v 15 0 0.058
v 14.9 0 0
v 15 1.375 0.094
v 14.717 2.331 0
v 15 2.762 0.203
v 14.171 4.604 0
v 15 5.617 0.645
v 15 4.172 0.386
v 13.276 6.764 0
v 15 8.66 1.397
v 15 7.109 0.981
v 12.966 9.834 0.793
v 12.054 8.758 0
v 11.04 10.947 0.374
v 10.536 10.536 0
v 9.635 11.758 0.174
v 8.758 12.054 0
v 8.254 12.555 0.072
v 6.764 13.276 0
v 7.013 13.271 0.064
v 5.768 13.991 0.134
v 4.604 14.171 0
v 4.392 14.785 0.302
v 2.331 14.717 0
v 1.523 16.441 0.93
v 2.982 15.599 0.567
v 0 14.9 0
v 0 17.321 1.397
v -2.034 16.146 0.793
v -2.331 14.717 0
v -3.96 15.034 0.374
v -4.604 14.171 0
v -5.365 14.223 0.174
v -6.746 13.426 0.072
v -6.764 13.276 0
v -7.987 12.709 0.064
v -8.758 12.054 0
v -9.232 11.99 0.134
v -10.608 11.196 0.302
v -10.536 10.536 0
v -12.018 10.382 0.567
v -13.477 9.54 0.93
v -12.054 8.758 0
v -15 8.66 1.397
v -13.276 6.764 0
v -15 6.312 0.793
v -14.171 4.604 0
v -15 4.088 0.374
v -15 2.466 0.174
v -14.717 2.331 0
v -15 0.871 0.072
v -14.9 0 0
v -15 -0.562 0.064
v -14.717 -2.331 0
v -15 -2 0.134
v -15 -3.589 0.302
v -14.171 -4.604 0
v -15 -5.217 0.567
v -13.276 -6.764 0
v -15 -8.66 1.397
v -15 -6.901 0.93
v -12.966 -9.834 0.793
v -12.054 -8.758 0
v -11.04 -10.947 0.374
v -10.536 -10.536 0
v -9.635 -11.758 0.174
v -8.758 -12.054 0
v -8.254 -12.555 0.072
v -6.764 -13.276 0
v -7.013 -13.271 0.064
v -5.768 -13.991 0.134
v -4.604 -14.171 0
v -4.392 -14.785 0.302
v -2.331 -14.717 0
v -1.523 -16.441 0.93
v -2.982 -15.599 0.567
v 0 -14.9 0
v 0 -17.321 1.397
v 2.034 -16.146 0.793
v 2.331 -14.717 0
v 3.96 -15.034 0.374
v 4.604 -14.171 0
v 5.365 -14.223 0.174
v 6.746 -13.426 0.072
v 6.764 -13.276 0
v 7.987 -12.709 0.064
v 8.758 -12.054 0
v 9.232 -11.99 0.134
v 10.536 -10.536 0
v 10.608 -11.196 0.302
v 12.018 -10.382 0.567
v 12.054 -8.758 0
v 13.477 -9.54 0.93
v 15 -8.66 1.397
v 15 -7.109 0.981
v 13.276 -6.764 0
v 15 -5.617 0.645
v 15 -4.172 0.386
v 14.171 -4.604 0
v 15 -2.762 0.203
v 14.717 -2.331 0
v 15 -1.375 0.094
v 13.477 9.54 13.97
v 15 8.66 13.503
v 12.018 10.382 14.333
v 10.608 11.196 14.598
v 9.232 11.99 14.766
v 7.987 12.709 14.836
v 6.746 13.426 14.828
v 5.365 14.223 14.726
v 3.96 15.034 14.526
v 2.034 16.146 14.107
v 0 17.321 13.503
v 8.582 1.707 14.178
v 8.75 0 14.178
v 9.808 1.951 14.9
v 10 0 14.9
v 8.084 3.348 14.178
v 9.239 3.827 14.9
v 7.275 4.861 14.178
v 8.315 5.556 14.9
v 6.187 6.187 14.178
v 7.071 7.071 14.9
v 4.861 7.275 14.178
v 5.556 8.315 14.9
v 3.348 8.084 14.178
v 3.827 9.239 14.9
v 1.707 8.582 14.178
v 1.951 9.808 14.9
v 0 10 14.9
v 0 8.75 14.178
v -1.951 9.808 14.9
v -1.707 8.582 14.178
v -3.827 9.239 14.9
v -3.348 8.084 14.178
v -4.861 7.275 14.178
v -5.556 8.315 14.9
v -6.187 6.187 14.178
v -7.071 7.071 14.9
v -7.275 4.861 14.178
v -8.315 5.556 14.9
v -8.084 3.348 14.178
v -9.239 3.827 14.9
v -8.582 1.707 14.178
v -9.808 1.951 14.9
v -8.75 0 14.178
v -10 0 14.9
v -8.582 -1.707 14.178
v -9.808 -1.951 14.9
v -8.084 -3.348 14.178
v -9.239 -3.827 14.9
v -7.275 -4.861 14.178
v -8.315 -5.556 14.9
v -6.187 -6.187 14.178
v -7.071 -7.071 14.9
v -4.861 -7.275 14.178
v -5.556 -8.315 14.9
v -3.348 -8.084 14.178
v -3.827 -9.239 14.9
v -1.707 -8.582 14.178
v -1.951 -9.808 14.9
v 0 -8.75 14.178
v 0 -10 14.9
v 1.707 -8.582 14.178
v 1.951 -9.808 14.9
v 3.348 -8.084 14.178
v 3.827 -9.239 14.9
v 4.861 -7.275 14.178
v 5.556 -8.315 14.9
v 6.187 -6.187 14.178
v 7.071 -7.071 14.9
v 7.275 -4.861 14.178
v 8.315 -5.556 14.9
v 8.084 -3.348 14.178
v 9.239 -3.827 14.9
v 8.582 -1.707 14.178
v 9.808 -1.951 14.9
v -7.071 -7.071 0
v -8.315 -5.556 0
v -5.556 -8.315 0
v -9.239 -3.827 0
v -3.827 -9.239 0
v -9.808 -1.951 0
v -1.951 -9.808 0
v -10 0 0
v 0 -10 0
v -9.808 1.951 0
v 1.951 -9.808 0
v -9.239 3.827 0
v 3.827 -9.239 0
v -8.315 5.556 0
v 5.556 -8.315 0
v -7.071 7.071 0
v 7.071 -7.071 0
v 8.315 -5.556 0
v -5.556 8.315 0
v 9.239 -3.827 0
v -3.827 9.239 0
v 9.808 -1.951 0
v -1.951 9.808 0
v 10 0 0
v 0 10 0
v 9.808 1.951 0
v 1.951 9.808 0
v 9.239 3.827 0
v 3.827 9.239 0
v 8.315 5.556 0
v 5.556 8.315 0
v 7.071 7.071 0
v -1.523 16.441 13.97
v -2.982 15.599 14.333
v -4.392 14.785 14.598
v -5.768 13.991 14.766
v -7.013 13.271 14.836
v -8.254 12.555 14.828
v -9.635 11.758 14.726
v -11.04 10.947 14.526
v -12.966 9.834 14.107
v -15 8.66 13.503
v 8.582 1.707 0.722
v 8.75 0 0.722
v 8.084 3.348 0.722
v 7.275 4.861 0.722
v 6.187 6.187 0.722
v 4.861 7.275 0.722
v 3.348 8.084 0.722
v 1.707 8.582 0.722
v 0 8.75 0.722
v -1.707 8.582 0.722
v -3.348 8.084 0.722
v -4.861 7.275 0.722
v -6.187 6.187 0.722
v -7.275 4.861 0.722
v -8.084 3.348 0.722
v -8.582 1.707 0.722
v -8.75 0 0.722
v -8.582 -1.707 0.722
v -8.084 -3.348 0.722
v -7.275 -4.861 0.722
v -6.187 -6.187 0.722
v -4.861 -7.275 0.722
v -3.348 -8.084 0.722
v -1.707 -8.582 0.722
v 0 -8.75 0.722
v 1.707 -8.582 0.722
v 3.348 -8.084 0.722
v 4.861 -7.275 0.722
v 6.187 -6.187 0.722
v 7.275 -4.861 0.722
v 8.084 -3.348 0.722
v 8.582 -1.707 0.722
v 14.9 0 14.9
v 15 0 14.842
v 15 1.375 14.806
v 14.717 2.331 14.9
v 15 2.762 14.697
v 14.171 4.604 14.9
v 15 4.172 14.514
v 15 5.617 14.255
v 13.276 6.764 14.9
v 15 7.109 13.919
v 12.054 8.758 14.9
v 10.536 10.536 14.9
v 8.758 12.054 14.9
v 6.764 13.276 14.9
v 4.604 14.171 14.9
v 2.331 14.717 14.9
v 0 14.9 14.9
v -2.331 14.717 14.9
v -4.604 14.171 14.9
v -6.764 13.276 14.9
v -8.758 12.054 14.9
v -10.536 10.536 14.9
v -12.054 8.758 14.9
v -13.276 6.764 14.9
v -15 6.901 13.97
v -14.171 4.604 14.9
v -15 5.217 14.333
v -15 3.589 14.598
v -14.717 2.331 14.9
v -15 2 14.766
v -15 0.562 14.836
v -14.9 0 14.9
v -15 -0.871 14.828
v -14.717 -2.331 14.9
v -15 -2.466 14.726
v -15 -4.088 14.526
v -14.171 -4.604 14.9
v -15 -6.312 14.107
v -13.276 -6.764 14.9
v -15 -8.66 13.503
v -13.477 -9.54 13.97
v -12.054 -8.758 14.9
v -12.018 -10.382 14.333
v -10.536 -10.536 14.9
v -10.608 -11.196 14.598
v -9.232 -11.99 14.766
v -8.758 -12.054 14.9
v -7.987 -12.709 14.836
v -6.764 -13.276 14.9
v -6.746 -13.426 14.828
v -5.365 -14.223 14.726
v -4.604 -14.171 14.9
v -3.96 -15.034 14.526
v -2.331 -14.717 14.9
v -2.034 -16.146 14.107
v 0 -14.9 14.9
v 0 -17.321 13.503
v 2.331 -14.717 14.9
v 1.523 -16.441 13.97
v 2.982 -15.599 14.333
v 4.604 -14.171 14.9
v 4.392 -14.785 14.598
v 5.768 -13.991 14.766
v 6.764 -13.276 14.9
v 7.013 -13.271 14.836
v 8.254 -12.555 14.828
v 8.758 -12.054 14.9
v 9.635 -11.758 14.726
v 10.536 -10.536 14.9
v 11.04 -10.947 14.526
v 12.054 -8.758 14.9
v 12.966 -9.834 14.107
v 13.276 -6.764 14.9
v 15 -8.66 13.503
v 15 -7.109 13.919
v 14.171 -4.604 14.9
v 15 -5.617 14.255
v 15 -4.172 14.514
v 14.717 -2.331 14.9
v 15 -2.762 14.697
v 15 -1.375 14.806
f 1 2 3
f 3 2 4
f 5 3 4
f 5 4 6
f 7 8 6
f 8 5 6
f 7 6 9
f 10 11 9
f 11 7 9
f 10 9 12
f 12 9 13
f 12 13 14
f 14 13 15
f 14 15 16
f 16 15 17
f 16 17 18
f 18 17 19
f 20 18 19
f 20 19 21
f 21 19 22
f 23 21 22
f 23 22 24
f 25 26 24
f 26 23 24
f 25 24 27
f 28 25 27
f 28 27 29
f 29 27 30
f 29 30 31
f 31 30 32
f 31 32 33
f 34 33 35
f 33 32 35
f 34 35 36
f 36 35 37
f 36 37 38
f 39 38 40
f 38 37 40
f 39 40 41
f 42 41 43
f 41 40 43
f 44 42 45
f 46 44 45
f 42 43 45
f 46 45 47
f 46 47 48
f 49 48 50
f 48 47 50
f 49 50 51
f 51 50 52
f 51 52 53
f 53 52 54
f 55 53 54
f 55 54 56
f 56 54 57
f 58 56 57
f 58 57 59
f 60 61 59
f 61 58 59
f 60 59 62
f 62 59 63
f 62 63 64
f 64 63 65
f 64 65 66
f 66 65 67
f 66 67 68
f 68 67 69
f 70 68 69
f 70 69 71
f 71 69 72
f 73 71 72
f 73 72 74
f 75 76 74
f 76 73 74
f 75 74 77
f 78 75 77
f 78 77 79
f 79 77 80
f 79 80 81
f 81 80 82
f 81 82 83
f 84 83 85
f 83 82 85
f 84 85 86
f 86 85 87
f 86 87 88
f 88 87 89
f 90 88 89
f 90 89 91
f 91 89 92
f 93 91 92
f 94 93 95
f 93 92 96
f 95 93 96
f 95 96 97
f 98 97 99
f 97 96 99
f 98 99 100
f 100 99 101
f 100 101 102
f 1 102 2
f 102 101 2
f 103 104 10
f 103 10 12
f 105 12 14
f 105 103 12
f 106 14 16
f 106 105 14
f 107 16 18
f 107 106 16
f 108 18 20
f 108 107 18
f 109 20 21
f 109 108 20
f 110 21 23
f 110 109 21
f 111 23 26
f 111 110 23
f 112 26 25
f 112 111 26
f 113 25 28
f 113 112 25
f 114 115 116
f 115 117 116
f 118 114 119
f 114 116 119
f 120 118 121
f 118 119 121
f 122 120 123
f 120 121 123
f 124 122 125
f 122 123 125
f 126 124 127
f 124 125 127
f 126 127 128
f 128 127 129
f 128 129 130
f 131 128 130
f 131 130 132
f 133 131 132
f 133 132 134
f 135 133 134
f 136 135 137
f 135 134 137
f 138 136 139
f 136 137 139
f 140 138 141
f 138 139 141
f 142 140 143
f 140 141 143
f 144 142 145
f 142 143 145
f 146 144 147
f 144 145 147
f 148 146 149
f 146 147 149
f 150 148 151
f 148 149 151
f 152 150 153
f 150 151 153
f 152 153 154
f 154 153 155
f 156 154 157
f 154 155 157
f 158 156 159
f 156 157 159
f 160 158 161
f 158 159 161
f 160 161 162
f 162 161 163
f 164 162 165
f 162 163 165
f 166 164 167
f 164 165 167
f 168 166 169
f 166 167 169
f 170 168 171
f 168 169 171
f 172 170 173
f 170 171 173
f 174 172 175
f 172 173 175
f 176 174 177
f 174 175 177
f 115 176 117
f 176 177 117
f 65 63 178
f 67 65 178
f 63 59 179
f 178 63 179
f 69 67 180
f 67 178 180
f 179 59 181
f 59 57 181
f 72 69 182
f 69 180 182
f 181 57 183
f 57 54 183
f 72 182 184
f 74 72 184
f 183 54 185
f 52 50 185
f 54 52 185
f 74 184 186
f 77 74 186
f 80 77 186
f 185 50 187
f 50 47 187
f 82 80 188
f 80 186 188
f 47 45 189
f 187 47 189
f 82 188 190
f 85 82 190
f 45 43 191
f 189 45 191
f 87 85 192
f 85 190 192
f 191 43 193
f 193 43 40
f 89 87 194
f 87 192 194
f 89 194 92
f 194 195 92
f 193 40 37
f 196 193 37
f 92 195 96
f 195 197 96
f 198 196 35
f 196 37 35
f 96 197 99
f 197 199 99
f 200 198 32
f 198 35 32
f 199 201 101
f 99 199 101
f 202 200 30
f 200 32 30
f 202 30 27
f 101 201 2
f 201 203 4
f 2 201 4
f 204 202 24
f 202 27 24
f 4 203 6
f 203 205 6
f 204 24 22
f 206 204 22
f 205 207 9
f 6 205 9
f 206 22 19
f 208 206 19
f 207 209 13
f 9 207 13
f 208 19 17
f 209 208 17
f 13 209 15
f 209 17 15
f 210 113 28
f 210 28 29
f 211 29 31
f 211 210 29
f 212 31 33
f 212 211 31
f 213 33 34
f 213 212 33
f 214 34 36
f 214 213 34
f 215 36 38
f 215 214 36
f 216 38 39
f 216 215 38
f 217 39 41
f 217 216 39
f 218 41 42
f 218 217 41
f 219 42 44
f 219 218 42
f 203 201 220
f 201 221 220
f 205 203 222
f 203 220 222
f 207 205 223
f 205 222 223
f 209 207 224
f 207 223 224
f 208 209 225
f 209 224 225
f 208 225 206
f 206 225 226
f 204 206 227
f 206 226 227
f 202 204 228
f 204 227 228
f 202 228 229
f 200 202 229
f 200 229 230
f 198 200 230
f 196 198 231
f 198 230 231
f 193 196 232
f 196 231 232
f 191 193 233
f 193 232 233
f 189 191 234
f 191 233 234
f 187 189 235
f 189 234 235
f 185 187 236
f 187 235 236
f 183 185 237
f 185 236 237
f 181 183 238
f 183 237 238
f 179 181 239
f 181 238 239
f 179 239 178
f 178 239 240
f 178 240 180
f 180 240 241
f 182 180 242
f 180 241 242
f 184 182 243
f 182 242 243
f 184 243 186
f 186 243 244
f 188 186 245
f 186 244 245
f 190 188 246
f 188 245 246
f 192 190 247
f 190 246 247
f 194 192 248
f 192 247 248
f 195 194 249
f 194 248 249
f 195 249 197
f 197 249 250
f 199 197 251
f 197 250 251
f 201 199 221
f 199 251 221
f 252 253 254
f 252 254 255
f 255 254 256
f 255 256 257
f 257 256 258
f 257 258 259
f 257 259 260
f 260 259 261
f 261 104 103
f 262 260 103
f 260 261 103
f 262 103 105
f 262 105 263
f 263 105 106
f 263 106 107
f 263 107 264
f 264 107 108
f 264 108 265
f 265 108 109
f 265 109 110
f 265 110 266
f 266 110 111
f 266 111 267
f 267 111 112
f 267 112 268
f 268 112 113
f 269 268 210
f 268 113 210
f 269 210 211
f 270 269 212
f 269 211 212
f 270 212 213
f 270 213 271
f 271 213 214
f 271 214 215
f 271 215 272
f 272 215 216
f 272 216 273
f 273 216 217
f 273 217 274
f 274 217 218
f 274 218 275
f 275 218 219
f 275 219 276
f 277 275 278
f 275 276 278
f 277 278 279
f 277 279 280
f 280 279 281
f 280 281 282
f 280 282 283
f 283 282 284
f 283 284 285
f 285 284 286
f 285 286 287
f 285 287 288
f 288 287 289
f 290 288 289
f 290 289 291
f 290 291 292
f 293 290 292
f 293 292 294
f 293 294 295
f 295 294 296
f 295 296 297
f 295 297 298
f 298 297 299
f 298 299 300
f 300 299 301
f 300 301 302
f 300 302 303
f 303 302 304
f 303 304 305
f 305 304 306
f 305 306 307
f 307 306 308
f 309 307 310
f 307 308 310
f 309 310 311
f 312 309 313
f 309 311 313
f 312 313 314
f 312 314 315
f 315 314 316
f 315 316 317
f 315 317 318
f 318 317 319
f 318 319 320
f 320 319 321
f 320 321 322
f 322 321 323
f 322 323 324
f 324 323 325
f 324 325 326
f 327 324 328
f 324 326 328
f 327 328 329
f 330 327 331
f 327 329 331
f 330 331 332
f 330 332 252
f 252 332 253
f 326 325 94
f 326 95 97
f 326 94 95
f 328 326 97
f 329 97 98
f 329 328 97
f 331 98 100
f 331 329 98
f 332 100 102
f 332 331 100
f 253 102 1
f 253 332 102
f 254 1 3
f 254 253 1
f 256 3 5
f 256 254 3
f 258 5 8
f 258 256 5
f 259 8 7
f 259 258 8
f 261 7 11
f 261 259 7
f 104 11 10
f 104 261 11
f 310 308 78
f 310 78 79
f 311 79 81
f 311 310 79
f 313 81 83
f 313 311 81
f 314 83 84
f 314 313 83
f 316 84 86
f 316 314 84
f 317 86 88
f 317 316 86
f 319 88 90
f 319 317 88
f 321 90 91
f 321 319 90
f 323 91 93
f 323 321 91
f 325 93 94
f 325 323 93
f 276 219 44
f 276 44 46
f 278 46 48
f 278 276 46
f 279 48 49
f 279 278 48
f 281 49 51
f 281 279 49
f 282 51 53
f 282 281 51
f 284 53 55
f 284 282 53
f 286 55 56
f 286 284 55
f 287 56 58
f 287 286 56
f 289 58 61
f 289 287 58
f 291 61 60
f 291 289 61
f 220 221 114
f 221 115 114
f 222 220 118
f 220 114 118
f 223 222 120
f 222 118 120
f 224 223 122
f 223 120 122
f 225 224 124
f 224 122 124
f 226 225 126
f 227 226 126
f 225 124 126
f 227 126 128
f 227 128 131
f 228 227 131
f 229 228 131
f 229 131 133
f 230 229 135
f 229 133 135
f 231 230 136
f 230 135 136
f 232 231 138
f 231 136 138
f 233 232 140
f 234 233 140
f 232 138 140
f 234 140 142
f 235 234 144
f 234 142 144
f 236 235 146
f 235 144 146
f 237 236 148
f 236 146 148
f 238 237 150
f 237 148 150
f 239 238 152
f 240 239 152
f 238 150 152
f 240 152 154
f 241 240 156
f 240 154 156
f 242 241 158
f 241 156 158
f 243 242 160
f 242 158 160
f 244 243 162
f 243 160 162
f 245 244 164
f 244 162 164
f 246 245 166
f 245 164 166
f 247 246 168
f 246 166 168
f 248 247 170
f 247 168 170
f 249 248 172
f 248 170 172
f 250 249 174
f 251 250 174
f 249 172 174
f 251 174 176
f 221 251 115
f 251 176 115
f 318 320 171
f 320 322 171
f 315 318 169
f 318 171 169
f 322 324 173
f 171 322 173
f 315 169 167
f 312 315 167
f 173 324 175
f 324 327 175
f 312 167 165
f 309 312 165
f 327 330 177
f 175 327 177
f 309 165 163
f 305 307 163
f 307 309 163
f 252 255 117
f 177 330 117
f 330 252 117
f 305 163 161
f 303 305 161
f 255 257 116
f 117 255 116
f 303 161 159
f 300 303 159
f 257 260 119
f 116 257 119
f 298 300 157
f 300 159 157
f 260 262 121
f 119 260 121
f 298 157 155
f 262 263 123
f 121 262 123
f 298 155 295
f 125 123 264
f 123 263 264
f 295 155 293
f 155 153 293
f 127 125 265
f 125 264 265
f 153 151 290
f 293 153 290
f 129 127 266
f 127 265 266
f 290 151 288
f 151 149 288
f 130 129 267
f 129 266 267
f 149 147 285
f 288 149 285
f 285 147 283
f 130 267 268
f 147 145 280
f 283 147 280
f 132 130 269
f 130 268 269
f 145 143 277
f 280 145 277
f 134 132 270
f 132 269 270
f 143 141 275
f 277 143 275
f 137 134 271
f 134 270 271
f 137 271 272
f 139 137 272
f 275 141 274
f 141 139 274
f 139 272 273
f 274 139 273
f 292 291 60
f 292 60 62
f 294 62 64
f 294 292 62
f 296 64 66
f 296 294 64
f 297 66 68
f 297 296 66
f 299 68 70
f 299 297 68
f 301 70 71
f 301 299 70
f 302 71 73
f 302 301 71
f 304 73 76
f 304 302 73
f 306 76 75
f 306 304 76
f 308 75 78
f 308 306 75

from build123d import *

# Parameters (mm, degrees)
SKETCH001_R  = 18
POCKET_DEPTH = 14.9


with BuildPart() as part:
    # Sketch → Revolution (revolve)
    with BuildSketch(Plane.XZ):
        Polygon((10, 0), (8.75, 0.721688), (8.75, 14.178312), (10, 14.9), (14.9, 14.9), (18, 13.110214), (18, 1.789786), (14.9, 0), align=None)
    revolve(axis=Axis((0, 0, 0), (0, 0, 1)))

    # Sketch001 → Pocket (cut)
    with BuildSketch(Plane(origin=(0, 0, 14.9), x_dir=(-1, 0, 0), z_dir=(0, 0, 1))):
        Circle(SKETCH001_R)
        Polygon((-15, 8.660254), (-15, -8.660254), (0, -17.320508), (15, -8.660254), (15, 8.660254), (0, 17.320508), align=None, mode=Mode.SUBTRACT)
    extrude(amount=-POCKET_DEPTH, mode=Mode.SUBTRACT)


solid = part.part
